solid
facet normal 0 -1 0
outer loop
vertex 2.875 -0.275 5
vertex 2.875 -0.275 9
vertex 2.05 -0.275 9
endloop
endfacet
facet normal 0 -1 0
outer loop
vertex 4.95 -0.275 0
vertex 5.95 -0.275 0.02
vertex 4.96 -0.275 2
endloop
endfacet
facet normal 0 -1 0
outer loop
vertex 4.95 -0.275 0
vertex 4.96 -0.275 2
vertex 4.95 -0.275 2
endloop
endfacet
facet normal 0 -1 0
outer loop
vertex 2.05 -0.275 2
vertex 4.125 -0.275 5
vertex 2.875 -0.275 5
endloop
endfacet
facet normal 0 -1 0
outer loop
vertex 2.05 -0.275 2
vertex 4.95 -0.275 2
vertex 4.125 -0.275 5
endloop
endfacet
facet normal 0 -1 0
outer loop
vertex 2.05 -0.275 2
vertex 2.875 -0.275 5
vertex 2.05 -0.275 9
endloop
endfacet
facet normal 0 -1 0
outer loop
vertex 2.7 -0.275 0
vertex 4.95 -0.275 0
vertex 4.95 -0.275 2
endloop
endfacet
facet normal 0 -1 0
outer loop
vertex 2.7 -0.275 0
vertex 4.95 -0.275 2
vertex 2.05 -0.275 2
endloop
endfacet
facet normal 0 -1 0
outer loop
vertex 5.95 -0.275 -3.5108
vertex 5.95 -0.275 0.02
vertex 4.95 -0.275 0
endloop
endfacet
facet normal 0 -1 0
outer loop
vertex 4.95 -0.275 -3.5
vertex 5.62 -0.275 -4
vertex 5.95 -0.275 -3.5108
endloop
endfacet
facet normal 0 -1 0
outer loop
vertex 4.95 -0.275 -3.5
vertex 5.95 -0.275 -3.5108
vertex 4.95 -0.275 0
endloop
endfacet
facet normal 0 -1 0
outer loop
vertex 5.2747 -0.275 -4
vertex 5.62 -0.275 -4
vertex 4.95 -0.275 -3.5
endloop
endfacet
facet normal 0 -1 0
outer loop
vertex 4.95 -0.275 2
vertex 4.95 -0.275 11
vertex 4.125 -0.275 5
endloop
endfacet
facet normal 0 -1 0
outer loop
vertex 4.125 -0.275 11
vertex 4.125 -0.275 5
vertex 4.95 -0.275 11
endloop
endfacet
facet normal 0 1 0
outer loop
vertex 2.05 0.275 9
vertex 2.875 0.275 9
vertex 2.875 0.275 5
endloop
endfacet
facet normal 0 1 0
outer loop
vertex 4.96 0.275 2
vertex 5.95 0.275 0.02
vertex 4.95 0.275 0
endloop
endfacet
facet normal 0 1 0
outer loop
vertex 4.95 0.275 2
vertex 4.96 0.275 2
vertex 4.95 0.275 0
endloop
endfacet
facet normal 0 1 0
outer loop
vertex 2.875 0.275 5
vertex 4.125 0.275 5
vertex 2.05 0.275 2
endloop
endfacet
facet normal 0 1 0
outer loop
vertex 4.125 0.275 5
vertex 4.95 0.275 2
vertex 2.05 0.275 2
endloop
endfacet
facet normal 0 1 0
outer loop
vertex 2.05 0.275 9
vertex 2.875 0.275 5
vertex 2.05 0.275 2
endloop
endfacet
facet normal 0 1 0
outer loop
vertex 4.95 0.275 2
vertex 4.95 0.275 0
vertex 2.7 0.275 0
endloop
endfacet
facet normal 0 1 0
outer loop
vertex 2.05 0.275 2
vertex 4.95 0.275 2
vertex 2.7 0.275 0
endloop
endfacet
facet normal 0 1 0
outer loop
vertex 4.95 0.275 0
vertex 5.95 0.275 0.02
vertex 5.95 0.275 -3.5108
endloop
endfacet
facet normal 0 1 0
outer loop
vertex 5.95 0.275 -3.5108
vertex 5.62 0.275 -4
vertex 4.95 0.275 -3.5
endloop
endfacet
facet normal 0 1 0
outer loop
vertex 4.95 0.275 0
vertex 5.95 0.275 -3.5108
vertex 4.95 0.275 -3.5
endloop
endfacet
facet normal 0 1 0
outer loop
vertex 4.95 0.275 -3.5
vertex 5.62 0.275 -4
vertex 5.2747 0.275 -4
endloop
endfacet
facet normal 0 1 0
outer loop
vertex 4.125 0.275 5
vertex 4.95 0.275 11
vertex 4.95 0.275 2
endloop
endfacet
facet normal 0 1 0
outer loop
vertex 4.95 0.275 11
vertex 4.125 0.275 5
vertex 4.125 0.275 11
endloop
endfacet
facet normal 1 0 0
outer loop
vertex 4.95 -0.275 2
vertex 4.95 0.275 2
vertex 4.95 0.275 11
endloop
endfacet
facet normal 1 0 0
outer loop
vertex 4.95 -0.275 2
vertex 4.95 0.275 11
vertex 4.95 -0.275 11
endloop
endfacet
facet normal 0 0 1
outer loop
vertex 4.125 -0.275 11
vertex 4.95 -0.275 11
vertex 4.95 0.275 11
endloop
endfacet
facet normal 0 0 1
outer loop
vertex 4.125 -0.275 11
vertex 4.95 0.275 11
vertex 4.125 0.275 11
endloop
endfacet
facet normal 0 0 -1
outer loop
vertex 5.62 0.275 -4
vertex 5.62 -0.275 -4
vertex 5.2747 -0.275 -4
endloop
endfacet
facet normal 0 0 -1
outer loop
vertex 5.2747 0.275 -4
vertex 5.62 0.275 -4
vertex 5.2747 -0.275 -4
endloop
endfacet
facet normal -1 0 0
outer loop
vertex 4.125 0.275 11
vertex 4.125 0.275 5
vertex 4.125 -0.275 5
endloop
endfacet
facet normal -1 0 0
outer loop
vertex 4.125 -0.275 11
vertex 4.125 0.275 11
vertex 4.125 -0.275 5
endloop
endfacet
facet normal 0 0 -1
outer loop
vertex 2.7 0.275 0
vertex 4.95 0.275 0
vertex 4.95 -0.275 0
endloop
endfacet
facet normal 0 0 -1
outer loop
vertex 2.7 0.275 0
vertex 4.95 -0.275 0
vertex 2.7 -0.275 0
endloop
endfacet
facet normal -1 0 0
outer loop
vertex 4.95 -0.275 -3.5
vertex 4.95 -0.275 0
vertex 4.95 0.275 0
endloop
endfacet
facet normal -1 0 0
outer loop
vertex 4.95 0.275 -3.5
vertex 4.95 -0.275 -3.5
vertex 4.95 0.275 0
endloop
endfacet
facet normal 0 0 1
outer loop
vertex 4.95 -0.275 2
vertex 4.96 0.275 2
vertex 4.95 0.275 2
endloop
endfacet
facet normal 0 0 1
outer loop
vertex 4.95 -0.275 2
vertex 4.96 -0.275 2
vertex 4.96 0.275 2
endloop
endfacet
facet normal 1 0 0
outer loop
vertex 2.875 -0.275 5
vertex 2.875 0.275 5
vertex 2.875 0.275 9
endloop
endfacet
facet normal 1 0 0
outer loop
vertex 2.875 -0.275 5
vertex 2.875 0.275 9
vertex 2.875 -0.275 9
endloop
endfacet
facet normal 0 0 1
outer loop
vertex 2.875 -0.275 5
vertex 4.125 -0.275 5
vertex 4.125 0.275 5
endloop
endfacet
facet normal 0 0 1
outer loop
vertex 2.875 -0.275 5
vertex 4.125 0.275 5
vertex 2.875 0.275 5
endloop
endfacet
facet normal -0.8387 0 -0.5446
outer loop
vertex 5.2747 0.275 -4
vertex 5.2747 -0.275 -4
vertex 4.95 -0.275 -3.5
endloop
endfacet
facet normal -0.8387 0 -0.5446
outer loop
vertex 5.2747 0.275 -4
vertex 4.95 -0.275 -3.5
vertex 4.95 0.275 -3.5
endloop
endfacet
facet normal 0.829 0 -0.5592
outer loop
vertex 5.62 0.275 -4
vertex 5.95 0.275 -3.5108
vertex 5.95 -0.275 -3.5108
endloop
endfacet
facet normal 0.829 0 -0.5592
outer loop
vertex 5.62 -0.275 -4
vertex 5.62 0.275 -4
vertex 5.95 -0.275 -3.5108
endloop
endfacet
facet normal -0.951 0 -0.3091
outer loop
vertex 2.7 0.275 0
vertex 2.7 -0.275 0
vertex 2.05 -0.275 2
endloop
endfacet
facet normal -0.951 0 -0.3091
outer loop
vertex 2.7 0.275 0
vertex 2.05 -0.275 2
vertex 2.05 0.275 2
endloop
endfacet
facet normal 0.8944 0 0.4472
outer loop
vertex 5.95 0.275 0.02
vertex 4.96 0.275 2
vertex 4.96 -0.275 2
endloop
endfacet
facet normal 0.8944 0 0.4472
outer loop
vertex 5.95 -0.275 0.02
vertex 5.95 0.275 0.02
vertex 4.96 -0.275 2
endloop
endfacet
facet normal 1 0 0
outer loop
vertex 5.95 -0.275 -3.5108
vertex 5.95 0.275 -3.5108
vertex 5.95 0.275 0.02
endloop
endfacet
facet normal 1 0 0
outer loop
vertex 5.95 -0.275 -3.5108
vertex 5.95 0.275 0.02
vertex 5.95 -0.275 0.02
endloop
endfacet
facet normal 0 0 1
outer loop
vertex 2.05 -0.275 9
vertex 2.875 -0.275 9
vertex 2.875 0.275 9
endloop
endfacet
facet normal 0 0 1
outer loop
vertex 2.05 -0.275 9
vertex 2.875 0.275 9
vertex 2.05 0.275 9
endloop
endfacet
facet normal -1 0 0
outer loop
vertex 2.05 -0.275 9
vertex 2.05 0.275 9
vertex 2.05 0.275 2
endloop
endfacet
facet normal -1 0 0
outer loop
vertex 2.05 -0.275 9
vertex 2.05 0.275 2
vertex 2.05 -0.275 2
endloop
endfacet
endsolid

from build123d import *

# Parameters (mm, degrees)
BOX066_W                = 2.9
BOX066_H                = 0.55
BOX066_DEPTH            = 15
BOX067_W                = 1.25
BOX067_H                = 0.55
BOX067_DEPTH            = 6
BOX068_W                = 1.1
BOX068_H                = 0.6
BOX068_DEPTH            = 2
BOX070_W                = 1
BOX070_H                = 0.55
BOX070_DEPTH            = 6
BOX069_W                = 3
BOX069_H                = 0.55
BOX069_DEPTH            = 4
CHAMFER030_SIZE2        = 0.65
CHAMFER030_SIZE         = 2
CHAMFER031_ANGLE        = 33
CHAMFER031_SIZE         = 0.5
CHAMFER033_ANGLE        = 56
CHAMFER033_SIZE         = 0.33
CHAMFER032_ANGLE        = 26.565
CHAMFER032_SIZE         = 1.98
BODY028_PLACEMENT_ANGLE = 180


with BuildPart() as part:
    # Box066 → Box066 (join)
    with BuildSketch(Plane(origin=(-4.95, -0.275, 0), x_dir=(1, 0, 0), z_dir=(0, 0, 1))):
        with Locations((1.45, 0.275)):
            Rectangle(BOX066_W, BOX066_H)
    extrude(amount=BOX066_DEPTH)

    # Box067 → Box067 (cut)
    with BuildSketch(Plane(origin=(-4.125, -0.275, 9), x_dir=(1, 0, 0), z_dir=(0, 0, 1))):
        with Locations((0.625, 0.275)):
            Rectangle(BOX067_W, BOX067_H)
    extrude(amount=BOX067_DEPTH, mode=Mode.SUBTRACT)

    # Box068 → Box068 (cut)
    with BuildSketch(Plane(origin=(-3, -0.3, 13), x_dir=(1, 0, 0), z_dir=(0, 0, 1))):
        with Locations((0.55, 0.3)):
            Rectangle(BOX068_W, BOX068_H)
    extrude(amount=BOX068_DEPTH, mode=Mode.SUBTRACT)

    # Box070 → Box070 (join)
    with BuildSketch(Plane(origin=(-5.95, -0.275, 0), x_dir=(1, 0, 0), z_dir=(0, 0, 1))):
        with Locations((0.5, 0.275)):
            Rectangle(BOX070_W, BOX070_H)
    extrude(amount=BOX070_DEPTH)

    # Box069 → Box069 (cut)
    with BuildSketch(Plane(origin=(-4.95, 0.275, 4), x_dir=(1, 0, 0), z_dir=(0, 0, -1))):
        with Locations((1.5, 0.275)):
            Rectangle(BOX069_W, BOX069_H)
    extrude(amount=BOX069_DEPTH, mode=Mode.SUBTRACT)

    # Chamfer030
    chamfer030_edges = [part.edges().sort_by_distance(p)[0] for p in [
        (-2.05, 0, 4),
    ]]
    chamfer030_side = part.faces().sort_by_distance((-2.05, 0, 8.5))[0]
    chamfer(chamfer030_edges, length=CHAMFER030_SIZE, length2=CHAMFER030_SIZE2, reference=chamfer030_side)

    # Chamfer031
    chamfer031_edges = [part.edges().sort_by_distance(p)[0] for p in [
        (-4.95, 0, 0),
    ]]
    chamfer031_side = part.faces().sort_by_distance((-4.95, 0, 2))[0]
    chamfer(chamfer031_edges, length=CHAMFER031_SIZE, angle=CHAMFER031_ANGLE, reference=chamfer031_side)

    # Chamfer033
    chamfer033_edges = [part.edges().sort_by_distance(p)[0] for p in [
        (-5.95, 0, 0),
    ]]
    chamfer033_side = part.faces().sort_by_distance((-5.612352, 0, 0))[0]
    chamfer(chamfer033_edges, length=CHAMFER033_SIZE, angle=CHAMFER033_ANGLE, reference=chamfer033_side)

    # Chamfer032
    chamfer032_edges = [part.edges().sort_by_distance(p)[0] for p in [
        (-5.95, 0, 6),
    ]]
    chamfer032_side = part.faces().sort_by_distance((-5.95, 0, 3.244623))[0]
    chamfer(chamfer032_edges, length=CHAMFER032_SIZE, angle=CHAMFER032_ANGLE, reference=chamfer032_side)


with BuildPart() as part_1:
    # Body028 placement: moved
    add(part.part.moved(Location((0, 0, -4))).rotate(Axis((0, 0, -4), (0, 0, 1)), BODY028_PLACEMENT_ANGLE))


solid = part_1.part
